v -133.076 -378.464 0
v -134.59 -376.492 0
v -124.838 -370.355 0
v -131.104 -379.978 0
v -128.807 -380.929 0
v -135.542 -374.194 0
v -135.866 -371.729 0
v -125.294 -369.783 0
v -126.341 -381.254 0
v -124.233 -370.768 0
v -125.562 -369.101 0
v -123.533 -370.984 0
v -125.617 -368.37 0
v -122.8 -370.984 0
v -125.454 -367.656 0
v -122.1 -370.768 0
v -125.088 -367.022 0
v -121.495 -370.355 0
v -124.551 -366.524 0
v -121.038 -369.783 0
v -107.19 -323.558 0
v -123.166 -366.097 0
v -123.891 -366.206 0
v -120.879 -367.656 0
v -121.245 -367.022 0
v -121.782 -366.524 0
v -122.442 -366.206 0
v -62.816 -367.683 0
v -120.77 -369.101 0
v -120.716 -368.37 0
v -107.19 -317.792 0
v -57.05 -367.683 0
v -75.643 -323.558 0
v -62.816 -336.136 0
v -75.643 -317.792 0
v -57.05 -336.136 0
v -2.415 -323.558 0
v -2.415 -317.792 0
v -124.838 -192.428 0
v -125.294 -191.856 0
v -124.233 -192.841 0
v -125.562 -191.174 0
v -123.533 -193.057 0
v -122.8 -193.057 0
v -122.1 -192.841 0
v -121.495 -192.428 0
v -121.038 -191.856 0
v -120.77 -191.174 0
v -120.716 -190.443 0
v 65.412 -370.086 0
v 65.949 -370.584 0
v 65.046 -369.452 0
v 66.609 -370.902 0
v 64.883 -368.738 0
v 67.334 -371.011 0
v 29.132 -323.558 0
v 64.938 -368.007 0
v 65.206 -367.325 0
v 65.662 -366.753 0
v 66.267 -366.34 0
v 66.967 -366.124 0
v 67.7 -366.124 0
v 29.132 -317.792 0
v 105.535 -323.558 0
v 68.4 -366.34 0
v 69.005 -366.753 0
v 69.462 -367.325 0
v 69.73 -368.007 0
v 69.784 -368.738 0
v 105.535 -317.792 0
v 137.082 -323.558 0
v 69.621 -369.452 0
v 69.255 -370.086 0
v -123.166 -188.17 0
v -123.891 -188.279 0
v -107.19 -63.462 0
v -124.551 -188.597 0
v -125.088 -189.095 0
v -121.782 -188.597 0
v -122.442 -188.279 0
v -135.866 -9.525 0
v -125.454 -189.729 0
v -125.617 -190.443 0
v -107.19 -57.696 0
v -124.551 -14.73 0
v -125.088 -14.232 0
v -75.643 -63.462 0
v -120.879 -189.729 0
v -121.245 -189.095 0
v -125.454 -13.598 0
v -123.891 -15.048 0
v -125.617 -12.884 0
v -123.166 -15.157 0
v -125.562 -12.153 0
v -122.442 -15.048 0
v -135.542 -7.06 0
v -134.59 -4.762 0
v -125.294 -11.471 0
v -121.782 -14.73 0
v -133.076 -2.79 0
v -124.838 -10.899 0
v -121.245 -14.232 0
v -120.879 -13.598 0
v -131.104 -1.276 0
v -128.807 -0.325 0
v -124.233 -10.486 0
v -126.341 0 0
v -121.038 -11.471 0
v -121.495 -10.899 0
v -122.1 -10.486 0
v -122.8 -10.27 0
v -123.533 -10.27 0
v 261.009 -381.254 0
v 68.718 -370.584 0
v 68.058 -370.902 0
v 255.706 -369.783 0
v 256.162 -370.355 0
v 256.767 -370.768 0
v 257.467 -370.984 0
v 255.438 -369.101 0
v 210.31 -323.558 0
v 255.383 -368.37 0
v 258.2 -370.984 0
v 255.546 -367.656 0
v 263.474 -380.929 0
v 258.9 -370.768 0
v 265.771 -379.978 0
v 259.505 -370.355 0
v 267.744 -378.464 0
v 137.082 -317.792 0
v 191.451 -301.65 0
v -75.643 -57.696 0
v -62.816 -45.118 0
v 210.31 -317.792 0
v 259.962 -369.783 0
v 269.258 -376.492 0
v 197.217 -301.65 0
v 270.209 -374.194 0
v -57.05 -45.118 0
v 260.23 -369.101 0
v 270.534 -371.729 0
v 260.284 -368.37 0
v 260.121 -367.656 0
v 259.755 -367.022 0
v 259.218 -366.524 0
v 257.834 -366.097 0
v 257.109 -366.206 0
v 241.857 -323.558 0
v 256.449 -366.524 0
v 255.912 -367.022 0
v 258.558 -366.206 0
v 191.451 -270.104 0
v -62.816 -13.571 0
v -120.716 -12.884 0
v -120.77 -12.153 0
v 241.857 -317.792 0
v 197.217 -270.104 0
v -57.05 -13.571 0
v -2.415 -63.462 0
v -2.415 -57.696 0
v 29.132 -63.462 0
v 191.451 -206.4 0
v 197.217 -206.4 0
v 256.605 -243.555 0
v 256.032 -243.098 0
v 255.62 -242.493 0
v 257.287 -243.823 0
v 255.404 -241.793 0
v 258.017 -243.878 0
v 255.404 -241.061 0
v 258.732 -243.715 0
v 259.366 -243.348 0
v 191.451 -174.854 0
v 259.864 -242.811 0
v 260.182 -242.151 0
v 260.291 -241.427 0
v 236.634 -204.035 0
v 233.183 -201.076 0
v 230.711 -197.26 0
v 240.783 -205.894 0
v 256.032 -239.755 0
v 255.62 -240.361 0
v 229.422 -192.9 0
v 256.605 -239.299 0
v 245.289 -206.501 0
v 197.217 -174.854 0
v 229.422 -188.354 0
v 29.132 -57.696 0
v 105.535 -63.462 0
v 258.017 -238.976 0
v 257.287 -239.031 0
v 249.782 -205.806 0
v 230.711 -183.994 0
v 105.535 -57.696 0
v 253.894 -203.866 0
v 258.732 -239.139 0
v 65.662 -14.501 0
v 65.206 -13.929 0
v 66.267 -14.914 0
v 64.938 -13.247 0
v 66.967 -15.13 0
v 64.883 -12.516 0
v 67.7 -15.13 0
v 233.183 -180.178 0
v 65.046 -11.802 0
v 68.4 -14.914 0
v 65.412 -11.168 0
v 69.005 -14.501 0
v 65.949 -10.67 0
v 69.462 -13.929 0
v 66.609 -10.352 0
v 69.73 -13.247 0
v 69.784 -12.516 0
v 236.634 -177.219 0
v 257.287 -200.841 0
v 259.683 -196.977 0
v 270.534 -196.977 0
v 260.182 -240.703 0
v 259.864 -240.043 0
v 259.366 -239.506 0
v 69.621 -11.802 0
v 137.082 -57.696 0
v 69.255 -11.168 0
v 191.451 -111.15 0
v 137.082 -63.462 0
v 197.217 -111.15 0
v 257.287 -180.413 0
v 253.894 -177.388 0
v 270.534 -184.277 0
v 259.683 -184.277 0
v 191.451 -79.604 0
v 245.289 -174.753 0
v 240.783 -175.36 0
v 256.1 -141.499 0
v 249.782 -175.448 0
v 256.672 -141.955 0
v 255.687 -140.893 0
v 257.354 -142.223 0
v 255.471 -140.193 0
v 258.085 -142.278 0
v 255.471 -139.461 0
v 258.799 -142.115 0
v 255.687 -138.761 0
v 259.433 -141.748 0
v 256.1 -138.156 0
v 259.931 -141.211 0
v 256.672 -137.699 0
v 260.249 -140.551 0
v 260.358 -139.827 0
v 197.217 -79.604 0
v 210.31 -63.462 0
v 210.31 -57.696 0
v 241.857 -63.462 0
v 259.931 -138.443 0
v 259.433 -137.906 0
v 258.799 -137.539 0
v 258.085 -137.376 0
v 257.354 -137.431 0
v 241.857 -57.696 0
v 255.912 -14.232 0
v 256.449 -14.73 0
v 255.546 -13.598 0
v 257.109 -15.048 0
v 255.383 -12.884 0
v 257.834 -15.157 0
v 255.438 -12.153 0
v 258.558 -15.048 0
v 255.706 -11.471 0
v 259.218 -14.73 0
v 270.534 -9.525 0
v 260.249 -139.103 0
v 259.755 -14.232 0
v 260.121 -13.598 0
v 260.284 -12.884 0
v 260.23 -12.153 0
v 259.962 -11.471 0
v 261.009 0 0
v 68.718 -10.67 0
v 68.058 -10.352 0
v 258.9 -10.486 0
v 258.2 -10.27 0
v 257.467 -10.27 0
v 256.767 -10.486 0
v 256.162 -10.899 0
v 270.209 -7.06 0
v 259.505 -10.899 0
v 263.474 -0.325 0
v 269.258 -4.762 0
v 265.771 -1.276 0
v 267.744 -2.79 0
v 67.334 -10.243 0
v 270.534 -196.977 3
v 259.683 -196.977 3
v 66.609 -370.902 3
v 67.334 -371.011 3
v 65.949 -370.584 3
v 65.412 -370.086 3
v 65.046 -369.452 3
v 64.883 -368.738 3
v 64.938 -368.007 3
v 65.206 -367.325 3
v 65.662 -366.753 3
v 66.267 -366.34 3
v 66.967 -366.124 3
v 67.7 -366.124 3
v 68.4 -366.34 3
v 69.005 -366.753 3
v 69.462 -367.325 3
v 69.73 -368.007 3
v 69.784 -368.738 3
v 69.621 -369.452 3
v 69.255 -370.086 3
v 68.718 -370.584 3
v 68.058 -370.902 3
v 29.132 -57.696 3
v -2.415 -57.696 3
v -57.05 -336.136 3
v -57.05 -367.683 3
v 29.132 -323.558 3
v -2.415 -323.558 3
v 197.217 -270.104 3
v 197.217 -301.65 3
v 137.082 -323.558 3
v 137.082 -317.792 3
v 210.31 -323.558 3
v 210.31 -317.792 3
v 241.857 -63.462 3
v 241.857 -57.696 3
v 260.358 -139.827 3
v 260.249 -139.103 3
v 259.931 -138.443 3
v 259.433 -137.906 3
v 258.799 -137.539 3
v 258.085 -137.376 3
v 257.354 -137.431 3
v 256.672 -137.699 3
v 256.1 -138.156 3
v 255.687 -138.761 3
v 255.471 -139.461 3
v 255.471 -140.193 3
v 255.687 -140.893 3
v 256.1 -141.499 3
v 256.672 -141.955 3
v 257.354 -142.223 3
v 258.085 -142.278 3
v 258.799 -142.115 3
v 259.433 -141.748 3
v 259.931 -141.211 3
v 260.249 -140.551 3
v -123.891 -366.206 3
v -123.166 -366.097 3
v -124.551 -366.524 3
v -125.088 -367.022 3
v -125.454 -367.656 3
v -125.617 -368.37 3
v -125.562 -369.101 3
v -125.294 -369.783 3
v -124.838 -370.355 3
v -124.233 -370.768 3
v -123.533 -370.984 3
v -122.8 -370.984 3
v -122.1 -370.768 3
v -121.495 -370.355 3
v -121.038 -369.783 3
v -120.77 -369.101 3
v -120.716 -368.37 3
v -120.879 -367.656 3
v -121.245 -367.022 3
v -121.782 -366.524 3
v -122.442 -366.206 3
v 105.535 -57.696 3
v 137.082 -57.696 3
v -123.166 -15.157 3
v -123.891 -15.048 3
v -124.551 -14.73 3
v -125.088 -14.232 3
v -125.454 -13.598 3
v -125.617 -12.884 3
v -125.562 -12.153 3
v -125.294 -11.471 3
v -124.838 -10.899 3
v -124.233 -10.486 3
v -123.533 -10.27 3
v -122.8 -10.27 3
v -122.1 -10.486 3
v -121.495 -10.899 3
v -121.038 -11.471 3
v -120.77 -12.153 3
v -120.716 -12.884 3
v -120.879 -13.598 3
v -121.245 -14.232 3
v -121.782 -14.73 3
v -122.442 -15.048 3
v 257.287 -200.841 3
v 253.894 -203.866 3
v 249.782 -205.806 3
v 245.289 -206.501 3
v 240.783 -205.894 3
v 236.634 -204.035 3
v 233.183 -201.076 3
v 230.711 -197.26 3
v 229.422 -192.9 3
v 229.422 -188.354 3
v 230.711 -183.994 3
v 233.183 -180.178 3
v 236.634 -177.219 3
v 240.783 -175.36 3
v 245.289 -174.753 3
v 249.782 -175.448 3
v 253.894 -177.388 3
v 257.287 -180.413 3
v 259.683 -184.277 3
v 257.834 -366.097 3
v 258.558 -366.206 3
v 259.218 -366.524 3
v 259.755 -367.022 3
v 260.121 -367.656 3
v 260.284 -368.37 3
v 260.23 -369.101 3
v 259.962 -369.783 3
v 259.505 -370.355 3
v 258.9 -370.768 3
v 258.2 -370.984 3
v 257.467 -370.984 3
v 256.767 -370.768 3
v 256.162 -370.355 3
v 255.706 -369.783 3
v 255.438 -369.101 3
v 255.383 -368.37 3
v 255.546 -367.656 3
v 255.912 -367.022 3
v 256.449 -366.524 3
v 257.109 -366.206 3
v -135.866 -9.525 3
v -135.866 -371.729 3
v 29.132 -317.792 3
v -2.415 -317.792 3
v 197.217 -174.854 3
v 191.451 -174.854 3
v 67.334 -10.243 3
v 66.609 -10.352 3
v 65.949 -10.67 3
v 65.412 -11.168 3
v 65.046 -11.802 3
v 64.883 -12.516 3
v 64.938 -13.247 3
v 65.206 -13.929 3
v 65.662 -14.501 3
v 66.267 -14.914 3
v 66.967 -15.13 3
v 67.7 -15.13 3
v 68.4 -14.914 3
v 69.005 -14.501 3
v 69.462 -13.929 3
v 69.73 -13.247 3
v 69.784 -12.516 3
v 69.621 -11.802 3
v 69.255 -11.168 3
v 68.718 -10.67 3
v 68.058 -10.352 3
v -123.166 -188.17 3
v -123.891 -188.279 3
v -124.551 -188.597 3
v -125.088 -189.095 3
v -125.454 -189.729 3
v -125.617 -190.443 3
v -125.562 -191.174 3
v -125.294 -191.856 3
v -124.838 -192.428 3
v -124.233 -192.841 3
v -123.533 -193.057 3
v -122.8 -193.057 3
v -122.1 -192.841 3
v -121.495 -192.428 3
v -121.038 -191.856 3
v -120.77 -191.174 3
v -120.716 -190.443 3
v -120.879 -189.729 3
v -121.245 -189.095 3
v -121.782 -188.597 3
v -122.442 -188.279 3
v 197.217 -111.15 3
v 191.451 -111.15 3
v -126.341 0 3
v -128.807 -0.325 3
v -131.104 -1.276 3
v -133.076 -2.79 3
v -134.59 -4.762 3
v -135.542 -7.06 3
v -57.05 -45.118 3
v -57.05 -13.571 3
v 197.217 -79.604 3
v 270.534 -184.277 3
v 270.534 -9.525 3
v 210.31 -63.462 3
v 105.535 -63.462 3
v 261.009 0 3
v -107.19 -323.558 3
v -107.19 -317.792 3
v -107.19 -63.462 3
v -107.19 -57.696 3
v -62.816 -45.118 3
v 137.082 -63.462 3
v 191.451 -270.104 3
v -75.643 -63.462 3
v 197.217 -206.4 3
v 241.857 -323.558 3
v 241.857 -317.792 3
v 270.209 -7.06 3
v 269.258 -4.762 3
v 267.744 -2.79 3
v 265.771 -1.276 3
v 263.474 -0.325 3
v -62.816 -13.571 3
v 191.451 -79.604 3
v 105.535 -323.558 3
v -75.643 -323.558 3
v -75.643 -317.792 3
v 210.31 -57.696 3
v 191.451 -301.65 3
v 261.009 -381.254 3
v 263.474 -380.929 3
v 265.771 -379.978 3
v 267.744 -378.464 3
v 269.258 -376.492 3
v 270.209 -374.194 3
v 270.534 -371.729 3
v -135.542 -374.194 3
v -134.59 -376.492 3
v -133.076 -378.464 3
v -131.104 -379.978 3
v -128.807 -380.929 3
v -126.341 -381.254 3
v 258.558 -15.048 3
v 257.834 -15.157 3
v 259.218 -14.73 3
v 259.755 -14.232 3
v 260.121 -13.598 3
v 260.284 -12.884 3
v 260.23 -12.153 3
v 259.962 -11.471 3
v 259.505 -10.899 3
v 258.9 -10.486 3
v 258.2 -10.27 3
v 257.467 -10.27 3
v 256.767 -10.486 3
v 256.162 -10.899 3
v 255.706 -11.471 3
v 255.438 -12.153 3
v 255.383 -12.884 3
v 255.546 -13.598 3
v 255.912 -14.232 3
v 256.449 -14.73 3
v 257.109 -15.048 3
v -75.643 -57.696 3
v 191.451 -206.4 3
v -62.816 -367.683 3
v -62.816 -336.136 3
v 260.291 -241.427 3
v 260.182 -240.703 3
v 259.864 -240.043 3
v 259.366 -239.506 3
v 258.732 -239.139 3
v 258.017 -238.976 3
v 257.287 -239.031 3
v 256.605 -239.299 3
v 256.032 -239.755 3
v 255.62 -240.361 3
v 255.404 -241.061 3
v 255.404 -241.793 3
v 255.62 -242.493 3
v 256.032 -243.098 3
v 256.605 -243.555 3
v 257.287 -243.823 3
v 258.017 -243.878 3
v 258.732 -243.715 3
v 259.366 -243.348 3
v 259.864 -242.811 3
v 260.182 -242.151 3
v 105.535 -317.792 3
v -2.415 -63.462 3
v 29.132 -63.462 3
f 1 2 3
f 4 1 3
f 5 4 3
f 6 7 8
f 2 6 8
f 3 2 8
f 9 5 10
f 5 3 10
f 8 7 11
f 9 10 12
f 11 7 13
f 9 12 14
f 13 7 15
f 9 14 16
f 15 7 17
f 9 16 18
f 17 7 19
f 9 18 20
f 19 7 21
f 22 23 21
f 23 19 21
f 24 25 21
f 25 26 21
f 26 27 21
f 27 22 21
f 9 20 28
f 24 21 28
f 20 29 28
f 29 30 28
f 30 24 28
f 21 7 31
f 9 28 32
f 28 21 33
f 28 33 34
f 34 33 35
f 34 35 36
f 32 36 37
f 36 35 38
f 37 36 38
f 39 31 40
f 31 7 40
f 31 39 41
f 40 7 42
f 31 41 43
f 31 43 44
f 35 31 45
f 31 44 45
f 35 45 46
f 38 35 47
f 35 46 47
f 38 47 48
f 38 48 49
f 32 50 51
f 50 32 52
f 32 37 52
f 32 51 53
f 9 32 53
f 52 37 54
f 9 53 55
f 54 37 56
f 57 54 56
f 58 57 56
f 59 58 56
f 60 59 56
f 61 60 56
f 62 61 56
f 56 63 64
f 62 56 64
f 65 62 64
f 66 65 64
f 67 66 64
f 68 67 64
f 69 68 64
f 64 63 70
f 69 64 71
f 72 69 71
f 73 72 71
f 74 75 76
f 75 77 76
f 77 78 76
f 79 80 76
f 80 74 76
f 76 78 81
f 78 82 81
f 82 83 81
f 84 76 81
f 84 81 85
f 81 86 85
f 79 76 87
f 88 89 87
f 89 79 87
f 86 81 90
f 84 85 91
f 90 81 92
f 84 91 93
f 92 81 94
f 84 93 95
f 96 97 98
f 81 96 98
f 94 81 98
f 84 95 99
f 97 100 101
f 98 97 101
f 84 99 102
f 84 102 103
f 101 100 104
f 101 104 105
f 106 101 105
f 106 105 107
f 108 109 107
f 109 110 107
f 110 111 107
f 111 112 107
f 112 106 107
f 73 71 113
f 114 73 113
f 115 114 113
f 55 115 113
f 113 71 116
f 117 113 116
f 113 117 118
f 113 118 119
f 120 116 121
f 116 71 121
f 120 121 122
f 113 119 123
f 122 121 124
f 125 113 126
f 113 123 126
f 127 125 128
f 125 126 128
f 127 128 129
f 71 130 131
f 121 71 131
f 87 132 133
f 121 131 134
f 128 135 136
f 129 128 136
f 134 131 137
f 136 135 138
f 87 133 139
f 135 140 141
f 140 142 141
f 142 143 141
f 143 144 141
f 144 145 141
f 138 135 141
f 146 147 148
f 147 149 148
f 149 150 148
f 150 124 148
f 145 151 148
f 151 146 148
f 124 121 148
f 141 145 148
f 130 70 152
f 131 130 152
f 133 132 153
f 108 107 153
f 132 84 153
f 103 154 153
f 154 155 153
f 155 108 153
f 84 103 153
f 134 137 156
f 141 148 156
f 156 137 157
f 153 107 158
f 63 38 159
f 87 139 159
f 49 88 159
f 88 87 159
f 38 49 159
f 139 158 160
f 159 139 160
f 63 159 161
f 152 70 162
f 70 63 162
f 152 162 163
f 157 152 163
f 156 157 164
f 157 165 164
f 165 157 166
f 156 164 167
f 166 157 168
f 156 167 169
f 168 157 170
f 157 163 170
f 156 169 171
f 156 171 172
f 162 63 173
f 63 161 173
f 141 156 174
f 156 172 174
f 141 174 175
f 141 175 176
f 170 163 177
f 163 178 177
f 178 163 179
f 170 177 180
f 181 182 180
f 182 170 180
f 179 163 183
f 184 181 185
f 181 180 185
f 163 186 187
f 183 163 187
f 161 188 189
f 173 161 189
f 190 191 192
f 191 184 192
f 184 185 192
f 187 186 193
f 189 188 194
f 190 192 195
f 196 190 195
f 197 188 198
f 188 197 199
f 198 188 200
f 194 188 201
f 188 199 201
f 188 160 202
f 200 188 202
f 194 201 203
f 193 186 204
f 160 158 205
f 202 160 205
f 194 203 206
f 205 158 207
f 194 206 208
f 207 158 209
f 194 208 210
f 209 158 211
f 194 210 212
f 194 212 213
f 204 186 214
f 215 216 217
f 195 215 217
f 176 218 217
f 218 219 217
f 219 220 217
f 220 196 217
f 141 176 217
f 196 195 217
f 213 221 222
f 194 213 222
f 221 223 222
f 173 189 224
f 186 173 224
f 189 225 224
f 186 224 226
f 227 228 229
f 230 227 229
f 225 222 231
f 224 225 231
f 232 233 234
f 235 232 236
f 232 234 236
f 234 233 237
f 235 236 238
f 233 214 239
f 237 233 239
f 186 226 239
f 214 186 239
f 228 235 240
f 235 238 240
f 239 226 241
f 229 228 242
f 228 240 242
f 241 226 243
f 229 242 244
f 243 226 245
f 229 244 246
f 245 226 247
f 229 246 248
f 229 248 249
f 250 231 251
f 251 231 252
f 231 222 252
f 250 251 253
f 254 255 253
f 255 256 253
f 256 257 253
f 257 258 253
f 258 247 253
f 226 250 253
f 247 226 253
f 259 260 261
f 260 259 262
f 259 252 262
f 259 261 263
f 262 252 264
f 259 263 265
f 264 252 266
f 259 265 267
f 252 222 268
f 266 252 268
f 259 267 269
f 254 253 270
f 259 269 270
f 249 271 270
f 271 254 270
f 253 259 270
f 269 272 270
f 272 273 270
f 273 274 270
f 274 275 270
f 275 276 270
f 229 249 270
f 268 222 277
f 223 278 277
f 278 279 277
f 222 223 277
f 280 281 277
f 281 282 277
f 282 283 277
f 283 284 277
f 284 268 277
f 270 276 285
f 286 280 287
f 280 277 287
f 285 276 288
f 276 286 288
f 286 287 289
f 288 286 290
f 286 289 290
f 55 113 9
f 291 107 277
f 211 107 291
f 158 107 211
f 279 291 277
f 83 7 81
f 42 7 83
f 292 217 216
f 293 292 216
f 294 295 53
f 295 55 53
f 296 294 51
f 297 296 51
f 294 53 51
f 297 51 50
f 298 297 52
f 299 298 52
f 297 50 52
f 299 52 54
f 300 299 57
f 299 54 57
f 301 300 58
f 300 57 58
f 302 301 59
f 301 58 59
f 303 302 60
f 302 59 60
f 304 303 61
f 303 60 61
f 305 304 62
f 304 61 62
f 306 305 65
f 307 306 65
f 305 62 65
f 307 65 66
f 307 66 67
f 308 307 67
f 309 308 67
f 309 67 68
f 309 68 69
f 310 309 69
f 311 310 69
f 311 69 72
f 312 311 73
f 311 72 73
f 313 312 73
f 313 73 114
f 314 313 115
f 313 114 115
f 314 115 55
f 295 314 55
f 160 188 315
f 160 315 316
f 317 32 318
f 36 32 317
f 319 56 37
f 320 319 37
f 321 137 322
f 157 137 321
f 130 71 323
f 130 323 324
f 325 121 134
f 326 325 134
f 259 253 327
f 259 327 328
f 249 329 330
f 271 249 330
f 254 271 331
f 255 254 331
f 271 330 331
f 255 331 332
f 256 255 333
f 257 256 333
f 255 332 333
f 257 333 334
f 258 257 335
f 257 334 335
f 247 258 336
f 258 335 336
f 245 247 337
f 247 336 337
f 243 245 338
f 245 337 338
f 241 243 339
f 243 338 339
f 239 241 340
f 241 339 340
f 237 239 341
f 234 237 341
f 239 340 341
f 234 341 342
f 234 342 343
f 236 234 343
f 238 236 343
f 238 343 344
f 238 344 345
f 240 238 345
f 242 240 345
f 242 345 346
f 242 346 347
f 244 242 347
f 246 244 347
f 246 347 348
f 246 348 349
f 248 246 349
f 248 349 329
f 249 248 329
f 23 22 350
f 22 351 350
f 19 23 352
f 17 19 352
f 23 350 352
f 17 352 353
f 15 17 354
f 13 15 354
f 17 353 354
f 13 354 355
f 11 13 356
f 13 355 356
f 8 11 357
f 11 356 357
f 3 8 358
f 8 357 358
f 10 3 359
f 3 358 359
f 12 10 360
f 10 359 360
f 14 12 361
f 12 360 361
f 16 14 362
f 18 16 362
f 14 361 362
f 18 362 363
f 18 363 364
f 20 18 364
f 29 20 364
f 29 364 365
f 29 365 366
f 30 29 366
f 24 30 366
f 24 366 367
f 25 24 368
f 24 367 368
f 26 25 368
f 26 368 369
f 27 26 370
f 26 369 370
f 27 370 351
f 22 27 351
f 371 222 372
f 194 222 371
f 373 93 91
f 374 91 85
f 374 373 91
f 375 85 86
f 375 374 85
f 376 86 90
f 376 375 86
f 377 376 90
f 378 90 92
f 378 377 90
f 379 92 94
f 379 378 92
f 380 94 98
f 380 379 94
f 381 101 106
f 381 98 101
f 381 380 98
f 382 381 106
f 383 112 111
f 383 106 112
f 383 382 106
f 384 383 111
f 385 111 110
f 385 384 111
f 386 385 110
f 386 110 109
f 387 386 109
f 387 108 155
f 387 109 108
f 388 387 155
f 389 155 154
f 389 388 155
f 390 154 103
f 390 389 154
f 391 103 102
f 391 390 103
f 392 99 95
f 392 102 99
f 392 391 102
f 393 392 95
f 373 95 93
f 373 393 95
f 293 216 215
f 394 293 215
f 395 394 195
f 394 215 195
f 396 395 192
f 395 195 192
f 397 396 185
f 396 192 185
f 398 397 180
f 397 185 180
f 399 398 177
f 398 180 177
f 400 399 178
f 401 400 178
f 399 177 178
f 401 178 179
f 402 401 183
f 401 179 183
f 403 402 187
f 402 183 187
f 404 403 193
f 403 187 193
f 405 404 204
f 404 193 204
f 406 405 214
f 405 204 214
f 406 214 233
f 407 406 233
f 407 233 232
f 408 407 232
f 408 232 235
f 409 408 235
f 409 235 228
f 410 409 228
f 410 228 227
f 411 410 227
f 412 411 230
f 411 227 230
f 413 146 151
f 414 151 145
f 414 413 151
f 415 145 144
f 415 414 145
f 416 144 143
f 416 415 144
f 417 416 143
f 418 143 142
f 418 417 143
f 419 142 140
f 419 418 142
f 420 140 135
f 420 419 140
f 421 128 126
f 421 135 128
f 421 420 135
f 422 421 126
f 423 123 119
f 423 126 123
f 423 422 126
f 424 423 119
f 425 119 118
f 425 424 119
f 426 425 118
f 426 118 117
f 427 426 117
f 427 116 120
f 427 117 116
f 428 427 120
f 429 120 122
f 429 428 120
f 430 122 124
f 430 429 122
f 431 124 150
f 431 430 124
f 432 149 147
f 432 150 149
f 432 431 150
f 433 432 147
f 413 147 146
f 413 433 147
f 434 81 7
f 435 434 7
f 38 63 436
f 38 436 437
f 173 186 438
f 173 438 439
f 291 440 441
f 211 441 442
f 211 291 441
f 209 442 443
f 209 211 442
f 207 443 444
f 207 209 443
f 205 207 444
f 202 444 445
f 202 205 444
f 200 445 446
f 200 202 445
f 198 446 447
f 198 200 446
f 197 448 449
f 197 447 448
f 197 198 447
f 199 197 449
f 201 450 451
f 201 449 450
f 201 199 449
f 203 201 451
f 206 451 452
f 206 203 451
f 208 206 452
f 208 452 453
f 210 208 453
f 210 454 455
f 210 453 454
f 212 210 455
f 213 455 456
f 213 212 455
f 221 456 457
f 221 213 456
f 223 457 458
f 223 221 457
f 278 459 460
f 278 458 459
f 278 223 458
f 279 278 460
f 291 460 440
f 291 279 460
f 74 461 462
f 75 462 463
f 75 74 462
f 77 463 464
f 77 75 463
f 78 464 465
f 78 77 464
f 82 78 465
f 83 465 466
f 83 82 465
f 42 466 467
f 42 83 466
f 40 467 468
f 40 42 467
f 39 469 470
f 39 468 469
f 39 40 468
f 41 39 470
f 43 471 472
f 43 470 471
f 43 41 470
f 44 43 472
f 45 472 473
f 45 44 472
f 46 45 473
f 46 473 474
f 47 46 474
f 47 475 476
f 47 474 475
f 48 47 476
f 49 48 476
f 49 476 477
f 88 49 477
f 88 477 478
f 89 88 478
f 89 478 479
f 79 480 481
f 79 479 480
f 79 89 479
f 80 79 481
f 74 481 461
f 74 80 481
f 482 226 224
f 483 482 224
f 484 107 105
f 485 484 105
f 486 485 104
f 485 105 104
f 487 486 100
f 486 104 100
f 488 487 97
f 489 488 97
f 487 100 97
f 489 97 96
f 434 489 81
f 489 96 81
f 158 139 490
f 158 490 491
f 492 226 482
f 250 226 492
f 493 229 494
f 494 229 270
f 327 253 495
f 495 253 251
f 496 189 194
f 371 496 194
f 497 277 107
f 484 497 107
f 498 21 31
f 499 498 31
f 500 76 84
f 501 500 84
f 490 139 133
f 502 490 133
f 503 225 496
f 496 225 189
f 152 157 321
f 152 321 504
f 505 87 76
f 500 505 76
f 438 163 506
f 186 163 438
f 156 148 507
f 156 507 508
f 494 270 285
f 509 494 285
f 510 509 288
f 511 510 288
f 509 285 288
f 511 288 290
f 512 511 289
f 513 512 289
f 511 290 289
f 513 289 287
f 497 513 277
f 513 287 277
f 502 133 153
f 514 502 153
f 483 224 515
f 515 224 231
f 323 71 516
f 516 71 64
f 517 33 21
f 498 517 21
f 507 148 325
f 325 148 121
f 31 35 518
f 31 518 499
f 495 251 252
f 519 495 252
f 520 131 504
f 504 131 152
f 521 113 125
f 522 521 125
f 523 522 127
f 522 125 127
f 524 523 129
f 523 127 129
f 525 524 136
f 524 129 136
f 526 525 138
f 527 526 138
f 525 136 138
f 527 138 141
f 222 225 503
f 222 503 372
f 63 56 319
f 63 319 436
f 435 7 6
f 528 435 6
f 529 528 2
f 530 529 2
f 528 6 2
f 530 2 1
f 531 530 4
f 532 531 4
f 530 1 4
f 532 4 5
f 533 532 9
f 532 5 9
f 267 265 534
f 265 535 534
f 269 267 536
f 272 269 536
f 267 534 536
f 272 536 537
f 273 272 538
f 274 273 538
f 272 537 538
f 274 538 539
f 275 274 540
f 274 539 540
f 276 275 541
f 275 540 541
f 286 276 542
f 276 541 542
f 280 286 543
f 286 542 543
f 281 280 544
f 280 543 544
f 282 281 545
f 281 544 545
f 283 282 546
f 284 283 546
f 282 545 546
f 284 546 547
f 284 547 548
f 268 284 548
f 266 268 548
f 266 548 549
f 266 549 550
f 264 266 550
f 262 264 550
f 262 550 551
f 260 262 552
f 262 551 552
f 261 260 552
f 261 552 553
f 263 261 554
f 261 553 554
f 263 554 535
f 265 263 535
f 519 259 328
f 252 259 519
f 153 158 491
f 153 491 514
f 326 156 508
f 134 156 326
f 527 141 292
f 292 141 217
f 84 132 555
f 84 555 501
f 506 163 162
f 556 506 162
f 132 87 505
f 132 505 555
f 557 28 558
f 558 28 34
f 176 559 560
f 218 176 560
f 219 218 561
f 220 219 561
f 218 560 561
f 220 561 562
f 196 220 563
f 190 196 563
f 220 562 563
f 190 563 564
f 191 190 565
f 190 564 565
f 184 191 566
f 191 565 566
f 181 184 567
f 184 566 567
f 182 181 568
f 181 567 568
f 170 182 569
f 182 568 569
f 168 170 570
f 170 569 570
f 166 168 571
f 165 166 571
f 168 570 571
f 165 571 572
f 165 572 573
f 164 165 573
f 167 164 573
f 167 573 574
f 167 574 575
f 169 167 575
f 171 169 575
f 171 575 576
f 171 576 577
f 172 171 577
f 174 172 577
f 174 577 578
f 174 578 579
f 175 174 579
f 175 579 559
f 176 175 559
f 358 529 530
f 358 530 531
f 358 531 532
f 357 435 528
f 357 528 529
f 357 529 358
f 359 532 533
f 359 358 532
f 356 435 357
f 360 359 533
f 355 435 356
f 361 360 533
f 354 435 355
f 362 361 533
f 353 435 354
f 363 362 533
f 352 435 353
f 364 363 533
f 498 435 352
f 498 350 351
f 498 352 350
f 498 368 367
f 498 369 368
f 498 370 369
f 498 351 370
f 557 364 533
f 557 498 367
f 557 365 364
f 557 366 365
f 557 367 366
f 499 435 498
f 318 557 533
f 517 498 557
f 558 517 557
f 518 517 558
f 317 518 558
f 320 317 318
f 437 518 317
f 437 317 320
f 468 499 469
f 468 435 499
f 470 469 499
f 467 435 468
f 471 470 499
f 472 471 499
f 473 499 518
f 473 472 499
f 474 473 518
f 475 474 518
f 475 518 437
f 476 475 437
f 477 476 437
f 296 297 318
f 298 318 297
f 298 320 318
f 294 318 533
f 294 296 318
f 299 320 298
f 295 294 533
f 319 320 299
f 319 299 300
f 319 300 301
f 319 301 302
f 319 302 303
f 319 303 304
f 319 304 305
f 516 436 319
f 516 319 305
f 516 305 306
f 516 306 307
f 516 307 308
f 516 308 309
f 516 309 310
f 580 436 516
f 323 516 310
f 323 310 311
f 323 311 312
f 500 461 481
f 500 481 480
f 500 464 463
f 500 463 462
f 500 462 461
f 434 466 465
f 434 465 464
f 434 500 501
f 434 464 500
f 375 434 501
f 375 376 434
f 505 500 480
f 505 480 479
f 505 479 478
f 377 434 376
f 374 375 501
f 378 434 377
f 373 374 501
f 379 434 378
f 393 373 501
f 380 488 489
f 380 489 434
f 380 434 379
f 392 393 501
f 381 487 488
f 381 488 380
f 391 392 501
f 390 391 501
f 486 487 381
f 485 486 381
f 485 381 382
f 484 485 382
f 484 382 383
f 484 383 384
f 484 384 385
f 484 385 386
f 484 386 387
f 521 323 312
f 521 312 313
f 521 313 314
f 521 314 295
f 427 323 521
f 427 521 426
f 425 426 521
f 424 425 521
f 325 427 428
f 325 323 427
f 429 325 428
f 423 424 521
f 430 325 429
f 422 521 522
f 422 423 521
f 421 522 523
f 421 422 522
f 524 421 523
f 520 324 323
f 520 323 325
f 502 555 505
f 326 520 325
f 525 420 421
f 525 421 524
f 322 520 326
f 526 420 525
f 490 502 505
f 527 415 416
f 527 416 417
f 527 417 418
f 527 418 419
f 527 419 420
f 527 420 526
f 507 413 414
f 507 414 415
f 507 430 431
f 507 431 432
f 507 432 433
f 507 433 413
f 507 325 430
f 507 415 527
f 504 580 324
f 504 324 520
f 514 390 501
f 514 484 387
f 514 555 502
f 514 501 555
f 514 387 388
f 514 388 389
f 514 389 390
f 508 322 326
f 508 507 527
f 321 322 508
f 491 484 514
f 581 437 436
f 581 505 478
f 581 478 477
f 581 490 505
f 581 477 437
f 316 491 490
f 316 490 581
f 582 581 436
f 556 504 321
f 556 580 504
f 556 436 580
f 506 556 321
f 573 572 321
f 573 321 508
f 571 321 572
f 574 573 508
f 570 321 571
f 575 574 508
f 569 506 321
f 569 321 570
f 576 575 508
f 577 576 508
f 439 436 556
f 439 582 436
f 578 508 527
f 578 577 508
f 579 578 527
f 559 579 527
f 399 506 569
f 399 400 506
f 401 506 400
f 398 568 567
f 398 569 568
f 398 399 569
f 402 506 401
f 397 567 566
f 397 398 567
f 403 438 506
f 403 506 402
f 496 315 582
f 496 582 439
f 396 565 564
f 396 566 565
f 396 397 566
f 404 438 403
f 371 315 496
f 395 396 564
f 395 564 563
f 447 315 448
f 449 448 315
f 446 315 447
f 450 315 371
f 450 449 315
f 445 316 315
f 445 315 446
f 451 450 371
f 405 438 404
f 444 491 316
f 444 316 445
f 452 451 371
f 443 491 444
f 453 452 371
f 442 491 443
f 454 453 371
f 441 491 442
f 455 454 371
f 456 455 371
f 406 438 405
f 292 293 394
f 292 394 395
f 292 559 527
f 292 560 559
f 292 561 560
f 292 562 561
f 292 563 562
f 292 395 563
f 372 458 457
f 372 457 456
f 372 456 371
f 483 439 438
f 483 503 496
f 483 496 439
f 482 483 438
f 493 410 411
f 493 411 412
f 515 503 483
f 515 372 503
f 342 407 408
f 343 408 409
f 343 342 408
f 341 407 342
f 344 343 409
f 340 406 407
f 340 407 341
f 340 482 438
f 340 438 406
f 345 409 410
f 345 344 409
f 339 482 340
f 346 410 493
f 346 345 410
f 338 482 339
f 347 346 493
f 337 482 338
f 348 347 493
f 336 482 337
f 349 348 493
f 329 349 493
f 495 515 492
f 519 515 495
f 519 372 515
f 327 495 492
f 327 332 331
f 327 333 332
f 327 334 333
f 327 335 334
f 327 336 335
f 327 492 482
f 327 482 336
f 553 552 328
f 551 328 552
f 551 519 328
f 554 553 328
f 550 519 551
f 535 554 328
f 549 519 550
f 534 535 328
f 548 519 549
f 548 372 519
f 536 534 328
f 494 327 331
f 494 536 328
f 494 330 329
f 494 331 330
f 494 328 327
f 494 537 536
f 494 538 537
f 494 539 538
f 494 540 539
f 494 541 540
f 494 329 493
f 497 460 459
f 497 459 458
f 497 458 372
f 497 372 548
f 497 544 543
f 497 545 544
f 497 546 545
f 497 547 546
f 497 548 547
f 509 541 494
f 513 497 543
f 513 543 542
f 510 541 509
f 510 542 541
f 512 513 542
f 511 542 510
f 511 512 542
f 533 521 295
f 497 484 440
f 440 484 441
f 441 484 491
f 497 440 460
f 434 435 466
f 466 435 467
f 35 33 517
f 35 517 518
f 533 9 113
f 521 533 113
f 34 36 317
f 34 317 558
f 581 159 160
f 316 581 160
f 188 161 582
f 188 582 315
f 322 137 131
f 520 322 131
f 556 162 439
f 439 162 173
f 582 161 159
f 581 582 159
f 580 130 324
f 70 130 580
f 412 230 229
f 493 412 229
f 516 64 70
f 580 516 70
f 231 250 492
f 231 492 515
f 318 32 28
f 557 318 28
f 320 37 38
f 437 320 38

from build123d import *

# Parameters (mm, degrees)
BOSS_EXTRUDE1_DEPTH                   = 3
F_10_0_1935_DIAMETER_HOLE2_AT_2_COUNT = 2
F_10_0_1935_DIAMETER_HOLE2_AT_2_PITCH = 260.668884466
F_10_0_1935_DIAMETER_HOLE1_D          = 4.9149
F_10_0_1935_DIAMETER_HOLE1_DEPTH      = 76.2
F_10_0_1935_DIAMETER_HOLE1_TIP        = 1.476584928
SKETCH9_W                             = 31.5468
SKETCH9_H                             = 5.7658
SKETCH9_W_2                           = 5.7658
SKETCH9_H_2                           = 31.5468
CUT_EXTRUDE1_DEPTH                    = 4


with BuildPart() as part:
    # Sketch1 → Boss-Extrude1 (new body)
    with BuildSketch(Plane.XY):
        with BuildLine():
            Line((-135.866260139, -66.675), (-135.866260139, -314.579))
            Line((-135.866260139, -314.579), (-135.866260139, -371.729))
            ThreePointArc((-135.866260139, -371.729), (-133.07645223, -378.464192091), (-126.341260139, -381.254))
            Line((-126.341260139, -381.254), (261.008739861, -381.254))
            ThreePointArc((261.008739861, -381.254), (267.743931952, -378.464192091), (270.533739861, -371.729))
            Line((270.533739861, -371.729), (270.533739861, -298.704))
            Line((270.533739861, -298.704), (270.533739861, -196.977))
            Line((270.533739861, -196.977), (259.683417693, -196.977))
            ThreePointArc((259.683417693, -196.977), (229.258739861, -190.627), (259.683417693, -184.277))
            Line((259.683417693, -184.277), (270.533739861, -184.277))
            Line((270.533739861, -184.277), (270.533739861, -82.55))
            Line((270.533739861, -82.55), (270.533739861, -9.525))
            ThreePointArc((270.533739861, -9.525), (267.743931952, -2.789807909), (261.008739861, 0))
            Line((261.008739861, 0), (-126.341260139, 0))
            ThreePointArc((-126.341260139, 0), (-133.07645223, -2.789807909), (-135.866260139, -9.525))
            Line((-135.866260139, -9.525), (-135.866260139, -66.675))
        make_face()
    extrude(amount=BOSS_EXTRUDE1_DEPTH)

    # Sketch2 → #10 (0.1935) Diameter Hole3 (revolve, cut)
    with BuildSketch(Plane(origin=(-123.166260139, -12.7, 3), x_dir=(0, -1, 0), z_dir=(1, 0, 0))):
        Polygon((0, 0), (0, 77.676584928), (2.45745, 76.2), (2.45745, 0), align=None)
    f_10_0_1935_diameter_hole3 = revolve(axis=Axis((-123.166260139, -12.7, 9.35), (0, 0, -1)), mode=Mode.SUBTRACT)

    # Sketch7 → #10 (0.1935) Diameter Hole2 (revolve, cut)
    with BuildSketch(Plane(origin=(67.333739861, -12.7, 0), x_dir=(0, 1, 0), z_dir=(1, 0, 0))):
        Polygon((0, 0), (0, 77.676584928), (2.45745, 76.2), (2.45745, 0), align=None)
    f_10_0_1935_diameter_hole2 = revolve(axis=Axis((67.333739861, -12.7, -6.35), (0, 0, 1)), mode=Mode.SUBTRACT)

    # #10 (0.1935) Diameter Hole2 at 2: #10 (0.1935) Diameter Hole2 ×2
    with Locations(*[Vector(-0.730812196, -0.682578591, 0) * (i * F_10_0_1935_DIAMETER_HOLE2_AT_2_PITCH) for i in range(1, F_10_0_1935_DIAMETER_HOLE2_AT_2_COUNT)]):
        add(f_10_0_1935_diameter_hole2, mode=Mode.SUBTRACT)

    # Mirror1: #10 (0.1935) Diameter Hole3 across plane
    add(f_10_0_1935_diameter_hole3.mirror(Plane.ZY.offset(-67.333739861)), mode=Mode.SUBTRACT)

    # Mirror2: #10 (0.1935) Diameter Hole3, #10 (0.1935) Diameter Hole2 across plane
    add(f_10_0_1935_diameter_hole3.mirror(Plane.ZX.offset(-190.627)), mode=Mode.SUBTRACT)
    add(f_10_0_1935_diameter_hole2.mirror(Plane.ZX.offset(-190.627)), mode=Mode.SUBTRACT)

    # Mirror2 copy 1 sketch → Mirror2 copy 1 (revolve, cut)
    with BuildSketch(Plane(origin=(257.833739861, -368.554, 3), x_dir=(0, 1, 0), z_dir=(-1, 0, 0))):
        Polygon((0, 0), (0, 77.676584928), (2.45745, 76.2), (2.45745, 0), align=None)
    revolve(axis=Axis((257.833739861, -368.554, 9.35), (0, 0, -1)), mode=Mode.SUBTRACT)

    # Mirror2 copy 2 sketch → Mirror2 copy 2 (revolve, cut)
    with BuildSketch(Plane(origin=(-123.166260139, -190.627, 0), x_dir=(0, -1, 0), z_dir=(1, 0, 0))):
        Polygon((0, 0), (0, -77.676584928), (2.45745, -76.2), (2.45745, 0), align=None)
    revolve(axis=Axis((-123.166260139, -190.627, -6.35), (0, 0, -1)), mode=Mode.SUBTRACT)

    # #10 (0.1935) Diameter Hole1
    with Locations(Plane(origin=(257.833739861, -241.426988864, 0), x_dir=(-1, 0, 0), z_dir=(0, 0, -1))):
        with Locations((0, 0), (-0.067272713, 101.599977728)):
            Hole(F_10_0_1935_DIAMETER_HOLE1_D / 2, depth=F_10_0_1935_DIAMETER_HOLE1_DEPTH)
            with Locations((0, 0, -(F_10_0_1935_DIAMETER_HOLE1_DEPTH + F_10_0_1935_DIAMETER_HOLE1_TIP / 2))):  # 118° drill point
                Cone(0, F_10_0_1935_DIAMETER_HOLE1_D / 2, F_10_0_1935_DIAMETER_HOLE1_TIP, mode=Mode.SUBTRACT)

    # Sketch9 → Cut-Extrude1 (cut, through all)
    with BuildSketch(Plane(origin=(0, 0, 0), x_dir=(-1, 0, 0), z_dir=(0, 0, -1))):
        with Locations((-121.308739861, -320.675)):
            Rectangle(SKETCH9_W, SKETCH9_H)
        with Locations((-226.083739861, -320.675)):
            Rectangle(SKETCH9_W, SKETCH9_H)
        with Locations((-194.333739861, -285.877)):
            Rectangle(SKETCH9_W_2, SKETCH9_H_2)
        with Locations((-194.333739861, -190.627)):
            Rectangle(SKETCH9_W_2, SKETCH9_H_2)
        with Locations((-194.333739861, -95.377)):
            Rectangle(SKETCH9_W_2, SKETCH9_H_2)
        with Locations((-226.083739861, -60.579)):
            Rectangle(SKETCH9_W, SKETCH9_H)
        with Locations((-121.308739861, -60.579)):
            Rectangle(SKETCH9_W, SKETCH9_H)
        with Locations((-13.358739861, -60.579)):
            Rectangle(SKETCH9_W, SKETCH9_H)
        with Locations((91.416260139, -60.579)):
            Rectangle(SKETCH9_W, SKETCH9_H)
        with Locations((59.932960139, -351.90938)):
            Rectangle(SKETCH9_W_2, SKETCH9_H_2)
        with Locations((59.932960139, -29.34462)):
            Rectangle(SKETCH9_W_2, SKETCH9_H_2)
        with Locations((91.416260139, -320.675)):
            Rectangle(SKETCH9_W, SKETCH9_H)
        with Locations((-13.358739861, -320.675)):
            Rectangle(SKETCH9_W, SKETCH9_H)
    extrude(amount=-CUT_EXTRUDE1_DEPTH, mode=Mode.SUBTRACT)


solid = part.part
